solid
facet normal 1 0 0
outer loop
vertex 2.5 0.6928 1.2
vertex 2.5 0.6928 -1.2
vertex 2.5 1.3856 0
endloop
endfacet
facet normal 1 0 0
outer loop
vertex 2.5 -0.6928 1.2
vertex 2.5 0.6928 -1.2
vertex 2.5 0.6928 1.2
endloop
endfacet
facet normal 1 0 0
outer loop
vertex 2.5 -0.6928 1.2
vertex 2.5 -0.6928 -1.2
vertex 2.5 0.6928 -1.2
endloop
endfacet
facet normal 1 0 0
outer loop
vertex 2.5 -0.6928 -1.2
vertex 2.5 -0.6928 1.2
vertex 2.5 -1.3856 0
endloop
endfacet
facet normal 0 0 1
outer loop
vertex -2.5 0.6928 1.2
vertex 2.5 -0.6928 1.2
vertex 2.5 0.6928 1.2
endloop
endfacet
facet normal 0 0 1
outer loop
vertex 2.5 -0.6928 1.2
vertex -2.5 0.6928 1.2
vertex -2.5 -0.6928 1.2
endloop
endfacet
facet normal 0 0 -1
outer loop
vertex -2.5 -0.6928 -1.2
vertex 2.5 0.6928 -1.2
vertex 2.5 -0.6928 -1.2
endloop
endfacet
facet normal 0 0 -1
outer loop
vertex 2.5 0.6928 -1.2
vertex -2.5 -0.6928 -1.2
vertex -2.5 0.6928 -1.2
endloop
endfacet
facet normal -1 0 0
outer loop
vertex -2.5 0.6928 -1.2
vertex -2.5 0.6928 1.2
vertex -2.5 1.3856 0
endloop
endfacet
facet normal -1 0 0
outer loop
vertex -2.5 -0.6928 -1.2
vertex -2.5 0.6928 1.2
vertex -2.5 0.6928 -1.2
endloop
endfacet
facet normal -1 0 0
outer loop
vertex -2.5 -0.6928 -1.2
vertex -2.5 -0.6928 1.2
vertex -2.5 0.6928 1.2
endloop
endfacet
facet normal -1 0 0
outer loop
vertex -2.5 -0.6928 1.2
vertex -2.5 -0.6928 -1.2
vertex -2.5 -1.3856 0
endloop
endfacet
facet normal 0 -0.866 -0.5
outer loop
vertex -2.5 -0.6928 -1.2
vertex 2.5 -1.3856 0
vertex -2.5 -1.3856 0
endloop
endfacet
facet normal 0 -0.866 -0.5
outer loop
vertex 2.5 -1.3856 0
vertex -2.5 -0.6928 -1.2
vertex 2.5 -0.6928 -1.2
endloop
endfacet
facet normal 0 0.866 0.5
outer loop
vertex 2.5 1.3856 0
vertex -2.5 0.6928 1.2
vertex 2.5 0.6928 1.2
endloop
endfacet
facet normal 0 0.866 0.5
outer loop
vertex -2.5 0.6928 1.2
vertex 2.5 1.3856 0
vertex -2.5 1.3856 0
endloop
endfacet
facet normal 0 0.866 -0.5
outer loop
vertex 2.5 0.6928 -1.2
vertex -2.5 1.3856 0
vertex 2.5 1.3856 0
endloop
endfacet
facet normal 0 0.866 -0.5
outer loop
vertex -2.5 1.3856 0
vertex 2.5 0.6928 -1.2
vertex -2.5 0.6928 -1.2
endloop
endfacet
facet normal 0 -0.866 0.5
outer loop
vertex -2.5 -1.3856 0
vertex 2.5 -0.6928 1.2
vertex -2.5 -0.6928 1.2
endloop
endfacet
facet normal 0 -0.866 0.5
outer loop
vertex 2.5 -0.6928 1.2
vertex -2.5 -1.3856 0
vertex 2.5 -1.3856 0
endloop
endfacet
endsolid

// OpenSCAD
pegD = 2.4;

for(a = [0,120,240]){
    rotate([a,0,0]) cube(size = [5,2 * (pegD / 2) * tan(30), pegD], center = true);
}
